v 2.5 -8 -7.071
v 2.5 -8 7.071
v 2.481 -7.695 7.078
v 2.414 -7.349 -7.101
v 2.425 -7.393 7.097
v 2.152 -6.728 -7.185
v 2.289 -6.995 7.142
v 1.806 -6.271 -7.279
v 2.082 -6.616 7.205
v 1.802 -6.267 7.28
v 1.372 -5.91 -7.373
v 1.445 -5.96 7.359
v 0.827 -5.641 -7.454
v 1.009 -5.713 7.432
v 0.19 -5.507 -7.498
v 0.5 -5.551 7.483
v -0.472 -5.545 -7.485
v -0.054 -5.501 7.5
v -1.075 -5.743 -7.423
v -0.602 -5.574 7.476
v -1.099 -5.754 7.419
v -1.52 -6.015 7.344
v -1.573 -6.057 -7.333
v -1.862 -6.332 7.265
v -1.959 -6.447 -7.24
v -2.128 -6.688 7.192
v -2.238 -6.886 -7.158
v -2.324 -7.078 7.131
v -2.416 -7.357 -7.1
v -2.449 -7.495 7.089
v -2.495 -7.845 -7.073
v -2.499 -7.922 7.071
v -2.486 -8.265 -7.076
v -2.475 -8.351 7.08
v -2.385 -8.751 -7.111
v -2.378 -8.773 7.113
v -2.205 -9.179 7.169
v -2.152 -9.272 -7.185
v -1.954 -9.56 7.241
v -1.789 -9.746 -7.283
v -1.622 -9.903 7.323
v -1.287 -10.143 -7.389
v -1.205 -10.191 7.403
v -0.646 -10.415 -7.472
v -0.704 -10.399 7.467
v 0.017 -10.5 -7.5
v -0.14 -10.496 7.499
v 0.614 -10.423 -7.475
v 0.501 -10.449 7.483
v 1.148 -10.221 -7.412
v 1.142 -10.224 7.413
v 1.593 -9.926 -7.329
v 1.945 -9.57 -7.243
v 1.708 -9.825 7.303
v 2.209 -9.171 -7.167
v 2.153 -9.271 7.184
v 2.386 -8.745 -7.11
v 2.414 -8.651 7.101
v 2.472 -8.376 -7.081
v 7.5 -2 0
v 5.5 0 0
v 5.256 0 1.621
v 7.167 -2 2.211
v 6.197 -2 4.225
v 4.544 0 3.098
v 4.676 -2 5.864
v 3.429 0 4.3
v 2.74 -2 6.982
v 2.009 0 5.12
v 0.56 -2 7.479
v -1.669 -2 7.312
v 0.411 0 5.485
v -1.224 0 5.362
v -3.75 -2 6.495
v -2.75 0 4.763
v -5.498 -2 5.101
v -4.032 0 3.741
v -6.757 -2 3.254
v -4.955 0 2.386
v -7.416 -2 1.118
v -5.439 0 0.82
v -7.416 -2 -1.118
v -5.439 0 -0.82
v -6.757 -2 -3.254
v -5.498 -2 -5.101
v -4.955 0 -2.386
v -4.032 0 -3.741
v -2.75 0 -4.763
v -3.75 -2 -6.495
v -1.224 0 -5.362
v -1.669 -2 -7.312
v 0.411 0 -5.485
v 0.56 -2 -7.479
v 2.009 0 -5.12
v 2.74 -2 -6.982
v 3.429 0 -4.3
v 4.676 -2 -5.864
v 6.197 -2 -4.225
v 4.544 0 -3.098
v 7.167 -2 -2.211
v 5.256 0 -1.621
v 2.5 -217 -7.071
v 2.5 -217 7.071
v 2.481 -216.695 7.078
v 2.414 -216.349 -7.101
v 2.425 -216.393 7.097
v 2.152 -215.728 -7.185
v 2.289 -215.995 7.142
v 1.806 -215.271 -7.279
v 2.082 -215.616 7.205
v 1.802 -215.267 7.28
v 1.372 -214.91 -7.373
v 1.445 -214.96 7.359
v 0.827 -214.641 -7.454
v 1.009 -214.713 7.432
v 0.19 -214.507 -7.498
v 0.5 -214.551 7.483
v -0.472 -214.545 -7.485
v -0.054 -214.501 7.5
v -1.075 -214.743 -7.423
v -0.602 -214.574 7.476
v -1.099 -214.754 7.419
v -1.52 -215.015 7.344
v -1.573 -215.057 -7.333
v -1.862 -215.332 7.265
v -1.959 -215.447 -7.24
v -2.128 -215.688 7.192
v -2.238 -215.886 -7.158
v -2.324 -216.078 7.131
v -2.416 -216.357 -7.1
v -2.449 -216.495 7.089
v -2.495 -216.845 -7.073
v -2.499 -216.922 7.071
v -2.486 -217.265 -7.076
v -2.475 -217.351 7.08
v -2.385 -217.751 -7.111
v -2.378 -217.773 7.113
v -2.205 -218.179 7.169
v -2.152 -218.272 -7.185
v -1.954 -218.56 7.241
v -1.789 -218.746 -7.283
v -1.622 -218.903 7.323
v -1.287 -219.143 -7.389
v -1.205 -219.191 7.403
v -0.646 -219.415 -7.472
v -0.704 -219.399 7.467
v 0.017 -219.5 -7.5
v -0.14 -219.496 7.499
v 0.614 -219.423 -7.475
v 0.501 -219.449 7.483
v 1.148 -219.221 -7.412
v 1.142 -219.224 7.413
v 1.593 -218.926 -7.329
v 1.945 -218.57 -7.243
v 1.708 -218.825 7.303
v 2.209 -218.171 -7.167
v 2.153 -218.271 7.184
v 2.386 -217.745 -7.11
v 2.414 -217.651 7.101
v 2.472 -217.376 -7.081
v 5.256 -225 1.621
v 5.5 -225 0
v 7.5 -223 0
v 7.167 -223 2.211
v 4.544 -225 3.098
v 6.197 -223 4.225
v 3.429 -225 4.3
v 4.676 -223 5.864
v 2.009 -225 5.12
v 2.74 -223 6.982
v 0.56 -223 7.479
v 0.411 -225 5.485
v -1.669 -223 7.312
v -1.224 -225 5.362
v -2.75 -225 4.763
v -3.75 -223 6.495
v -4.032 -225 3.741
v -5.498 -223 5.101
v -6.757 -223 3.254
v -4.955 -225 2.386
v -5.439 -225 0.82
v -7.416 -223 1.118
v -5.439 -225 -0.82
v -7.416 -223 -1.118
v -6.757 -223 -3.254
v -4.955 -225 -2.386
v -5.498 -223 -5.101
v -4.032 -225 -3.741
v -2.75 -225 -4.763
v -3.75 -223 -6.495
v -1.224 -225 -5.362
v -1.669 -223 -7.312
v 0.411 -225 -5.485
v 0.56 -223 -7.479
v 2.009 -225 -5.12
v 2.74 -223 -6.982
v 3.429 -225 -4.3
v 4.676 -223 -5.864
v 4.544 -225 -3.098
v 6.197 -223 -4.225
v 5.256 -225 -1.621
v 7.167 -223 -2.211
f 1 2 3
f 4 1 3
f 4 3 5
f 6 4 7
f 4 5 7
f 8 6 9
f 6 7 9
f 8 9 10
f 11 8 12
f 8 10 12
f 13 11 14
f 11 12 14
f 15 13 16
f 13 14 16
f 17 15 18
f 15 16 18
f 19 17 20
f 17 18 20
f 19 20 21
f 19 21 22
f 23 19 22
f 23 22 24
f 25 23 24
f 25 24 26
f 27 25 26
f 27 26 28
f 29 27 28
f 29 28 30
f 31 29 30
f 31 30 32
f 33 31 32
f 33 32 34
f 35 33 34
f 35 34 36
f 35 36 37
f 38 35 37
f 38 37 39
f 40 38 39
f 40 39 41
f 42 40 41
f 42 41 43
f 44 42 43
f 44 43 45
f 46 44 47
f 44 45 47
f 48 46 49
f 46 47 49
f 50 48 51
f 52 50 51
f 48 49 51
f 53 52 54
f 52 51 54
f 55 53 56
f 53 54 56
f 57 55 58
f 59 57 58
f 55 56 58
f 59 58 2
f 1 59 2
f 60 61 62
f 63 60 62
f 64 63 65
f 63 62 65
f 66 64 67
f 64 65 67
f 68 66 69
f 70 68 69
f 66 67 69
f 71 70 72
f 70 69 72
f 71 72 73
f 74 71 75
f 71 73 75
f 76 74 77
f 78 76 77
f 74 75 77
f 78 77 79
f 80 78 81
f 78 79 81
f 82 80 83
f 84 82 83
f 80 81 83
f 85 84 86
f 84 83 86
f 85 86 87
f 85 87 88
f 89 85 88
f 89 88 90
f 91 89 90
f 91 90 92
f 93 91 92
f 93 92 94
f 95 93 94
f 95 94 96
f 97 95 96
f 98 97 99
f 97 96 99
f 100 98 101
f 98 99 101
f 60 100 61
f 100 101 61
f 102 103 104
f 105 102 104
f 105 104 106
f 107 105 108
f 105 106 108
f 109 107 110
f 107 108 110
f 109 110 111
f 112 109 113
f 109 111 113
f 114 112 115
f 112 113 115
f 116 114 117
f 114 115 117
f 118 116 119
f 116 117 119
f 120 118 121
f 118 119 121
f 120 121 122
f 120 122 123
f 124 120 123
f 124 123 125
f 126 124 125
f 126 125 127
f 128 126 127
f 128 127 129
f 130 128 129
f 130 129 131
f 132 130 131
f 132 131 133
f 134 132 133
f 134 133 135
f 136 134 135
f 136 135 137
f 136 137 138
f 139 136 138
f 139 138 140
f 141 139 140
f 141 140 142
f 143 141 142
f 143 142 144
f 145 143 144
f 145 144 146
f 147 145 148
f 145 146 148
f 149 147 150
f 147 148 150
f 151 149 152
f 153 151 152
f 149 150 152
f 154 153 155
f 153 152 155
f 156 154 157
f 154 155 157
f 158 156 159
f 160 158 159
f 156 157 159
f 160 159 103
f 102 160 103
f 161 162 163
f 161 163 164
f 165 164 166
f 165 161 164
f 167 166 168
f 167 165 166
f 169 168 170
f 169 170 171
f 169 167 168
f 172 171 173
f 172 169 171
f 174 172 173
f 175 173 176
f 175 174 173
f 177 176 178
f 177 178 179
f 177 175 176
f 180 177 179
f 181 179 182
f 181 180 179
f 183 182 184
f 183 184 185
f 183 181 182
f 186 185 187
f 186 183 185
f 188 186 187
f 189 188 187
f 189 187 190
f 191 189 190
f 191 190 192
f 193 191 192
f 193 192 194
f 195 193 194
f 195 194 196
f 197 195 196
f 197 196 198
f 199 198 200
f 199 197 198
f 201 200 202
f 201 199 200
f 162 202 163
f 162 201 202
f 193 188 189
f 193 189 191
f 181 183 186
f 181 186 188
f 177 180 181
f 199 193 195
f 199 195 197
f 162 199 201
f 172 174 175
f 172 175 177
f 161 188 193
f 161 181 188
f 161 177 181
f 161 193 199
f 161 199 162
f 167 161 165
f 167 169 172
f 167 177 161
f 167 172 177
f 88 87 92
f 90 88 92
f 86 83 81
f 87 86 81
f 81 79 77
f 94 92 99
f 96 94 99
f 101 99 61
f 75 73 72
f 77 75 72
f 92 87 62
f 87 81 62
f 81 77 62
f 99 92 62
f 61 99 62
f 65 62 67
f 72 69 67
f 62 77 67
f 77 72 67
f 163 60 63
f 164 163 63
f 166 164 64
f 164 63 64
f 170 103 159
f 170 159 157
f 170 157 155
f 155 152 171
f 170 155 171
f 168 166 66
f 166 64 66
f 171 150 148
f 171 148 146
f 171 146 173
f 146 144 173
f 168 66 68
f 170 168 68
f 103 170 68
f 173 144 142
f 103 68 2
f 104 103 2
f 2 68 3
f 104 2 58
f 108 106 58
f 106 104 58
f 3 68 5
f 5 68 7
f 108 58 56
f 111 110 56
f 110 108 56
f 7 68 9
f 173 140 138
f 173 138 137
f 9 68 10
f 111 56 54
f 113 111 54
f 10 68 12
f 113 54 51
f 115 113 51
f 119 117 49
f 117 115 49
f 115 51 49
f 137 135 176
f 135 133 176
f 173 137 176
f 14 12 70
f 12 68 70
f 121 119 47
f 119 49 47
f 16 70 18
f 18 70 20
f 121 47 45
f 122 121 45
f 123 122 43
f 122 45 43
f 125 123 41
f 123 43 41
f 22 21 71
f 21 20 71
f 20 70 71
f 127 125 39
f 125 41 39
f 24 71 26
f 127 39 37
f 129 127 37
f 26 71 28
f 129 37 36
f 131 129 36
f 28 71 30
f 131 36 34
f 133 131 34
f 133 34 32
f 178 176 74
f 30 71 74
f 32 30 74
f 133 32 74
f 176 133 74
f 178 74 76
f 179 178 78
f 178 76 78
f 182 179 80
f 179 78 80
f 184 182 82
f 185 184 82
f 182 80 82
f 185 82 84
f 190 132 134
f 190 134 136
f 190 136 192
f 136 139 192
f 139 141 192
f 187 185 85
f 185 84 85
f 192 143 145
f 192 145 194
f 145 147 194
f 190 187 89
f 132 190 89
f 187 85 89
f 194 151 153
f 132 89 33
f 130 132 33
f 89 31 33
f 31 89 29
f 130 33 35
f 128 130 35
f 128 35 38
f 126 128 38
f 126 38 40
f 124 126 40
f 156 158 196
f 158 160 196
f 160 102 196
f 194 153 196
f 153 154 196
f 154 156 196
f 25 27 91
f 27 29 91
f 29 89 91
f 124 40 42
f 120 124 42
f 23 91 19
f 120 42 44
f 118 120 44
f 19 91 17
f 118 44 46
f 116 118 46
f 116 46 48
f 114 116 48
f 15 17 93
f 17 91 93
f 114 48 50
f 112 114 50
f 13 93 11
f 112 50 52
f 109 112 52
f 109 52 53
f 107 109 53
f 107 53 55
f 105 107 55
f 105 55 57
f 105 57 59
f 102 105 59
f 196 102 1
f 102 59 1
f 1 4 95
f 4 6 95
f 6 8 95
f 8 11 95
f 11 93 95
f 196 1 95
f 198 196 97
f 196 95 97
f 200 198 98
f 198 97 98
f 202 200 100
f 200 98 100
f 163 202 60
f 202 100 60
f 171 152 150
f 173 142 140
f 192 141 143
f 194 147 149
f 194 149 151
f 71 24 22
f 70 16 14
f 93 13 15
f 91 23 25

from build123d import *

# Parameters (mm, degrees)
F0_R     = 7.5
F1_DEPTH = 225
F3_R     = 2.5
F4_DEPTH = 15.001
F5_SIZE  = 2
F6_SIZE  = 2


with BuildPart() as f1:
    # F0 (on Front) → F1 (new body)
    with BuildSketch(Plane.XZ):
        Circle(F0_R)
    extrude(amount=F1_DEPTH)

    # F3 (on offset) → F4 (cut, through all)
    with BuildSketch(Plane.XY.offset(7.5)):
        with Locations((0, -8)):
            Circle(F3_R)
        with Locations((0, -217)):
            Circle(F3_R)
    extrude(amount=-F4_DEPTH, mode=Mode.SUBTRACT)

    # F5
    f5_edges = [f1.edges().sort_by_distance(p)[0] for p in [
        (-7.5, -225, 0),
    ]]
    chamfer(f5_edges, length=F5_SIZE)

    # F6
    f6_edges = [f1.edges().sort_by_distance(p)[0] for p in [
        (-7.5, 0, 0),
    ]]
    chamfer(f6_edges, length=F6_SIZE)


solid = f1.part
